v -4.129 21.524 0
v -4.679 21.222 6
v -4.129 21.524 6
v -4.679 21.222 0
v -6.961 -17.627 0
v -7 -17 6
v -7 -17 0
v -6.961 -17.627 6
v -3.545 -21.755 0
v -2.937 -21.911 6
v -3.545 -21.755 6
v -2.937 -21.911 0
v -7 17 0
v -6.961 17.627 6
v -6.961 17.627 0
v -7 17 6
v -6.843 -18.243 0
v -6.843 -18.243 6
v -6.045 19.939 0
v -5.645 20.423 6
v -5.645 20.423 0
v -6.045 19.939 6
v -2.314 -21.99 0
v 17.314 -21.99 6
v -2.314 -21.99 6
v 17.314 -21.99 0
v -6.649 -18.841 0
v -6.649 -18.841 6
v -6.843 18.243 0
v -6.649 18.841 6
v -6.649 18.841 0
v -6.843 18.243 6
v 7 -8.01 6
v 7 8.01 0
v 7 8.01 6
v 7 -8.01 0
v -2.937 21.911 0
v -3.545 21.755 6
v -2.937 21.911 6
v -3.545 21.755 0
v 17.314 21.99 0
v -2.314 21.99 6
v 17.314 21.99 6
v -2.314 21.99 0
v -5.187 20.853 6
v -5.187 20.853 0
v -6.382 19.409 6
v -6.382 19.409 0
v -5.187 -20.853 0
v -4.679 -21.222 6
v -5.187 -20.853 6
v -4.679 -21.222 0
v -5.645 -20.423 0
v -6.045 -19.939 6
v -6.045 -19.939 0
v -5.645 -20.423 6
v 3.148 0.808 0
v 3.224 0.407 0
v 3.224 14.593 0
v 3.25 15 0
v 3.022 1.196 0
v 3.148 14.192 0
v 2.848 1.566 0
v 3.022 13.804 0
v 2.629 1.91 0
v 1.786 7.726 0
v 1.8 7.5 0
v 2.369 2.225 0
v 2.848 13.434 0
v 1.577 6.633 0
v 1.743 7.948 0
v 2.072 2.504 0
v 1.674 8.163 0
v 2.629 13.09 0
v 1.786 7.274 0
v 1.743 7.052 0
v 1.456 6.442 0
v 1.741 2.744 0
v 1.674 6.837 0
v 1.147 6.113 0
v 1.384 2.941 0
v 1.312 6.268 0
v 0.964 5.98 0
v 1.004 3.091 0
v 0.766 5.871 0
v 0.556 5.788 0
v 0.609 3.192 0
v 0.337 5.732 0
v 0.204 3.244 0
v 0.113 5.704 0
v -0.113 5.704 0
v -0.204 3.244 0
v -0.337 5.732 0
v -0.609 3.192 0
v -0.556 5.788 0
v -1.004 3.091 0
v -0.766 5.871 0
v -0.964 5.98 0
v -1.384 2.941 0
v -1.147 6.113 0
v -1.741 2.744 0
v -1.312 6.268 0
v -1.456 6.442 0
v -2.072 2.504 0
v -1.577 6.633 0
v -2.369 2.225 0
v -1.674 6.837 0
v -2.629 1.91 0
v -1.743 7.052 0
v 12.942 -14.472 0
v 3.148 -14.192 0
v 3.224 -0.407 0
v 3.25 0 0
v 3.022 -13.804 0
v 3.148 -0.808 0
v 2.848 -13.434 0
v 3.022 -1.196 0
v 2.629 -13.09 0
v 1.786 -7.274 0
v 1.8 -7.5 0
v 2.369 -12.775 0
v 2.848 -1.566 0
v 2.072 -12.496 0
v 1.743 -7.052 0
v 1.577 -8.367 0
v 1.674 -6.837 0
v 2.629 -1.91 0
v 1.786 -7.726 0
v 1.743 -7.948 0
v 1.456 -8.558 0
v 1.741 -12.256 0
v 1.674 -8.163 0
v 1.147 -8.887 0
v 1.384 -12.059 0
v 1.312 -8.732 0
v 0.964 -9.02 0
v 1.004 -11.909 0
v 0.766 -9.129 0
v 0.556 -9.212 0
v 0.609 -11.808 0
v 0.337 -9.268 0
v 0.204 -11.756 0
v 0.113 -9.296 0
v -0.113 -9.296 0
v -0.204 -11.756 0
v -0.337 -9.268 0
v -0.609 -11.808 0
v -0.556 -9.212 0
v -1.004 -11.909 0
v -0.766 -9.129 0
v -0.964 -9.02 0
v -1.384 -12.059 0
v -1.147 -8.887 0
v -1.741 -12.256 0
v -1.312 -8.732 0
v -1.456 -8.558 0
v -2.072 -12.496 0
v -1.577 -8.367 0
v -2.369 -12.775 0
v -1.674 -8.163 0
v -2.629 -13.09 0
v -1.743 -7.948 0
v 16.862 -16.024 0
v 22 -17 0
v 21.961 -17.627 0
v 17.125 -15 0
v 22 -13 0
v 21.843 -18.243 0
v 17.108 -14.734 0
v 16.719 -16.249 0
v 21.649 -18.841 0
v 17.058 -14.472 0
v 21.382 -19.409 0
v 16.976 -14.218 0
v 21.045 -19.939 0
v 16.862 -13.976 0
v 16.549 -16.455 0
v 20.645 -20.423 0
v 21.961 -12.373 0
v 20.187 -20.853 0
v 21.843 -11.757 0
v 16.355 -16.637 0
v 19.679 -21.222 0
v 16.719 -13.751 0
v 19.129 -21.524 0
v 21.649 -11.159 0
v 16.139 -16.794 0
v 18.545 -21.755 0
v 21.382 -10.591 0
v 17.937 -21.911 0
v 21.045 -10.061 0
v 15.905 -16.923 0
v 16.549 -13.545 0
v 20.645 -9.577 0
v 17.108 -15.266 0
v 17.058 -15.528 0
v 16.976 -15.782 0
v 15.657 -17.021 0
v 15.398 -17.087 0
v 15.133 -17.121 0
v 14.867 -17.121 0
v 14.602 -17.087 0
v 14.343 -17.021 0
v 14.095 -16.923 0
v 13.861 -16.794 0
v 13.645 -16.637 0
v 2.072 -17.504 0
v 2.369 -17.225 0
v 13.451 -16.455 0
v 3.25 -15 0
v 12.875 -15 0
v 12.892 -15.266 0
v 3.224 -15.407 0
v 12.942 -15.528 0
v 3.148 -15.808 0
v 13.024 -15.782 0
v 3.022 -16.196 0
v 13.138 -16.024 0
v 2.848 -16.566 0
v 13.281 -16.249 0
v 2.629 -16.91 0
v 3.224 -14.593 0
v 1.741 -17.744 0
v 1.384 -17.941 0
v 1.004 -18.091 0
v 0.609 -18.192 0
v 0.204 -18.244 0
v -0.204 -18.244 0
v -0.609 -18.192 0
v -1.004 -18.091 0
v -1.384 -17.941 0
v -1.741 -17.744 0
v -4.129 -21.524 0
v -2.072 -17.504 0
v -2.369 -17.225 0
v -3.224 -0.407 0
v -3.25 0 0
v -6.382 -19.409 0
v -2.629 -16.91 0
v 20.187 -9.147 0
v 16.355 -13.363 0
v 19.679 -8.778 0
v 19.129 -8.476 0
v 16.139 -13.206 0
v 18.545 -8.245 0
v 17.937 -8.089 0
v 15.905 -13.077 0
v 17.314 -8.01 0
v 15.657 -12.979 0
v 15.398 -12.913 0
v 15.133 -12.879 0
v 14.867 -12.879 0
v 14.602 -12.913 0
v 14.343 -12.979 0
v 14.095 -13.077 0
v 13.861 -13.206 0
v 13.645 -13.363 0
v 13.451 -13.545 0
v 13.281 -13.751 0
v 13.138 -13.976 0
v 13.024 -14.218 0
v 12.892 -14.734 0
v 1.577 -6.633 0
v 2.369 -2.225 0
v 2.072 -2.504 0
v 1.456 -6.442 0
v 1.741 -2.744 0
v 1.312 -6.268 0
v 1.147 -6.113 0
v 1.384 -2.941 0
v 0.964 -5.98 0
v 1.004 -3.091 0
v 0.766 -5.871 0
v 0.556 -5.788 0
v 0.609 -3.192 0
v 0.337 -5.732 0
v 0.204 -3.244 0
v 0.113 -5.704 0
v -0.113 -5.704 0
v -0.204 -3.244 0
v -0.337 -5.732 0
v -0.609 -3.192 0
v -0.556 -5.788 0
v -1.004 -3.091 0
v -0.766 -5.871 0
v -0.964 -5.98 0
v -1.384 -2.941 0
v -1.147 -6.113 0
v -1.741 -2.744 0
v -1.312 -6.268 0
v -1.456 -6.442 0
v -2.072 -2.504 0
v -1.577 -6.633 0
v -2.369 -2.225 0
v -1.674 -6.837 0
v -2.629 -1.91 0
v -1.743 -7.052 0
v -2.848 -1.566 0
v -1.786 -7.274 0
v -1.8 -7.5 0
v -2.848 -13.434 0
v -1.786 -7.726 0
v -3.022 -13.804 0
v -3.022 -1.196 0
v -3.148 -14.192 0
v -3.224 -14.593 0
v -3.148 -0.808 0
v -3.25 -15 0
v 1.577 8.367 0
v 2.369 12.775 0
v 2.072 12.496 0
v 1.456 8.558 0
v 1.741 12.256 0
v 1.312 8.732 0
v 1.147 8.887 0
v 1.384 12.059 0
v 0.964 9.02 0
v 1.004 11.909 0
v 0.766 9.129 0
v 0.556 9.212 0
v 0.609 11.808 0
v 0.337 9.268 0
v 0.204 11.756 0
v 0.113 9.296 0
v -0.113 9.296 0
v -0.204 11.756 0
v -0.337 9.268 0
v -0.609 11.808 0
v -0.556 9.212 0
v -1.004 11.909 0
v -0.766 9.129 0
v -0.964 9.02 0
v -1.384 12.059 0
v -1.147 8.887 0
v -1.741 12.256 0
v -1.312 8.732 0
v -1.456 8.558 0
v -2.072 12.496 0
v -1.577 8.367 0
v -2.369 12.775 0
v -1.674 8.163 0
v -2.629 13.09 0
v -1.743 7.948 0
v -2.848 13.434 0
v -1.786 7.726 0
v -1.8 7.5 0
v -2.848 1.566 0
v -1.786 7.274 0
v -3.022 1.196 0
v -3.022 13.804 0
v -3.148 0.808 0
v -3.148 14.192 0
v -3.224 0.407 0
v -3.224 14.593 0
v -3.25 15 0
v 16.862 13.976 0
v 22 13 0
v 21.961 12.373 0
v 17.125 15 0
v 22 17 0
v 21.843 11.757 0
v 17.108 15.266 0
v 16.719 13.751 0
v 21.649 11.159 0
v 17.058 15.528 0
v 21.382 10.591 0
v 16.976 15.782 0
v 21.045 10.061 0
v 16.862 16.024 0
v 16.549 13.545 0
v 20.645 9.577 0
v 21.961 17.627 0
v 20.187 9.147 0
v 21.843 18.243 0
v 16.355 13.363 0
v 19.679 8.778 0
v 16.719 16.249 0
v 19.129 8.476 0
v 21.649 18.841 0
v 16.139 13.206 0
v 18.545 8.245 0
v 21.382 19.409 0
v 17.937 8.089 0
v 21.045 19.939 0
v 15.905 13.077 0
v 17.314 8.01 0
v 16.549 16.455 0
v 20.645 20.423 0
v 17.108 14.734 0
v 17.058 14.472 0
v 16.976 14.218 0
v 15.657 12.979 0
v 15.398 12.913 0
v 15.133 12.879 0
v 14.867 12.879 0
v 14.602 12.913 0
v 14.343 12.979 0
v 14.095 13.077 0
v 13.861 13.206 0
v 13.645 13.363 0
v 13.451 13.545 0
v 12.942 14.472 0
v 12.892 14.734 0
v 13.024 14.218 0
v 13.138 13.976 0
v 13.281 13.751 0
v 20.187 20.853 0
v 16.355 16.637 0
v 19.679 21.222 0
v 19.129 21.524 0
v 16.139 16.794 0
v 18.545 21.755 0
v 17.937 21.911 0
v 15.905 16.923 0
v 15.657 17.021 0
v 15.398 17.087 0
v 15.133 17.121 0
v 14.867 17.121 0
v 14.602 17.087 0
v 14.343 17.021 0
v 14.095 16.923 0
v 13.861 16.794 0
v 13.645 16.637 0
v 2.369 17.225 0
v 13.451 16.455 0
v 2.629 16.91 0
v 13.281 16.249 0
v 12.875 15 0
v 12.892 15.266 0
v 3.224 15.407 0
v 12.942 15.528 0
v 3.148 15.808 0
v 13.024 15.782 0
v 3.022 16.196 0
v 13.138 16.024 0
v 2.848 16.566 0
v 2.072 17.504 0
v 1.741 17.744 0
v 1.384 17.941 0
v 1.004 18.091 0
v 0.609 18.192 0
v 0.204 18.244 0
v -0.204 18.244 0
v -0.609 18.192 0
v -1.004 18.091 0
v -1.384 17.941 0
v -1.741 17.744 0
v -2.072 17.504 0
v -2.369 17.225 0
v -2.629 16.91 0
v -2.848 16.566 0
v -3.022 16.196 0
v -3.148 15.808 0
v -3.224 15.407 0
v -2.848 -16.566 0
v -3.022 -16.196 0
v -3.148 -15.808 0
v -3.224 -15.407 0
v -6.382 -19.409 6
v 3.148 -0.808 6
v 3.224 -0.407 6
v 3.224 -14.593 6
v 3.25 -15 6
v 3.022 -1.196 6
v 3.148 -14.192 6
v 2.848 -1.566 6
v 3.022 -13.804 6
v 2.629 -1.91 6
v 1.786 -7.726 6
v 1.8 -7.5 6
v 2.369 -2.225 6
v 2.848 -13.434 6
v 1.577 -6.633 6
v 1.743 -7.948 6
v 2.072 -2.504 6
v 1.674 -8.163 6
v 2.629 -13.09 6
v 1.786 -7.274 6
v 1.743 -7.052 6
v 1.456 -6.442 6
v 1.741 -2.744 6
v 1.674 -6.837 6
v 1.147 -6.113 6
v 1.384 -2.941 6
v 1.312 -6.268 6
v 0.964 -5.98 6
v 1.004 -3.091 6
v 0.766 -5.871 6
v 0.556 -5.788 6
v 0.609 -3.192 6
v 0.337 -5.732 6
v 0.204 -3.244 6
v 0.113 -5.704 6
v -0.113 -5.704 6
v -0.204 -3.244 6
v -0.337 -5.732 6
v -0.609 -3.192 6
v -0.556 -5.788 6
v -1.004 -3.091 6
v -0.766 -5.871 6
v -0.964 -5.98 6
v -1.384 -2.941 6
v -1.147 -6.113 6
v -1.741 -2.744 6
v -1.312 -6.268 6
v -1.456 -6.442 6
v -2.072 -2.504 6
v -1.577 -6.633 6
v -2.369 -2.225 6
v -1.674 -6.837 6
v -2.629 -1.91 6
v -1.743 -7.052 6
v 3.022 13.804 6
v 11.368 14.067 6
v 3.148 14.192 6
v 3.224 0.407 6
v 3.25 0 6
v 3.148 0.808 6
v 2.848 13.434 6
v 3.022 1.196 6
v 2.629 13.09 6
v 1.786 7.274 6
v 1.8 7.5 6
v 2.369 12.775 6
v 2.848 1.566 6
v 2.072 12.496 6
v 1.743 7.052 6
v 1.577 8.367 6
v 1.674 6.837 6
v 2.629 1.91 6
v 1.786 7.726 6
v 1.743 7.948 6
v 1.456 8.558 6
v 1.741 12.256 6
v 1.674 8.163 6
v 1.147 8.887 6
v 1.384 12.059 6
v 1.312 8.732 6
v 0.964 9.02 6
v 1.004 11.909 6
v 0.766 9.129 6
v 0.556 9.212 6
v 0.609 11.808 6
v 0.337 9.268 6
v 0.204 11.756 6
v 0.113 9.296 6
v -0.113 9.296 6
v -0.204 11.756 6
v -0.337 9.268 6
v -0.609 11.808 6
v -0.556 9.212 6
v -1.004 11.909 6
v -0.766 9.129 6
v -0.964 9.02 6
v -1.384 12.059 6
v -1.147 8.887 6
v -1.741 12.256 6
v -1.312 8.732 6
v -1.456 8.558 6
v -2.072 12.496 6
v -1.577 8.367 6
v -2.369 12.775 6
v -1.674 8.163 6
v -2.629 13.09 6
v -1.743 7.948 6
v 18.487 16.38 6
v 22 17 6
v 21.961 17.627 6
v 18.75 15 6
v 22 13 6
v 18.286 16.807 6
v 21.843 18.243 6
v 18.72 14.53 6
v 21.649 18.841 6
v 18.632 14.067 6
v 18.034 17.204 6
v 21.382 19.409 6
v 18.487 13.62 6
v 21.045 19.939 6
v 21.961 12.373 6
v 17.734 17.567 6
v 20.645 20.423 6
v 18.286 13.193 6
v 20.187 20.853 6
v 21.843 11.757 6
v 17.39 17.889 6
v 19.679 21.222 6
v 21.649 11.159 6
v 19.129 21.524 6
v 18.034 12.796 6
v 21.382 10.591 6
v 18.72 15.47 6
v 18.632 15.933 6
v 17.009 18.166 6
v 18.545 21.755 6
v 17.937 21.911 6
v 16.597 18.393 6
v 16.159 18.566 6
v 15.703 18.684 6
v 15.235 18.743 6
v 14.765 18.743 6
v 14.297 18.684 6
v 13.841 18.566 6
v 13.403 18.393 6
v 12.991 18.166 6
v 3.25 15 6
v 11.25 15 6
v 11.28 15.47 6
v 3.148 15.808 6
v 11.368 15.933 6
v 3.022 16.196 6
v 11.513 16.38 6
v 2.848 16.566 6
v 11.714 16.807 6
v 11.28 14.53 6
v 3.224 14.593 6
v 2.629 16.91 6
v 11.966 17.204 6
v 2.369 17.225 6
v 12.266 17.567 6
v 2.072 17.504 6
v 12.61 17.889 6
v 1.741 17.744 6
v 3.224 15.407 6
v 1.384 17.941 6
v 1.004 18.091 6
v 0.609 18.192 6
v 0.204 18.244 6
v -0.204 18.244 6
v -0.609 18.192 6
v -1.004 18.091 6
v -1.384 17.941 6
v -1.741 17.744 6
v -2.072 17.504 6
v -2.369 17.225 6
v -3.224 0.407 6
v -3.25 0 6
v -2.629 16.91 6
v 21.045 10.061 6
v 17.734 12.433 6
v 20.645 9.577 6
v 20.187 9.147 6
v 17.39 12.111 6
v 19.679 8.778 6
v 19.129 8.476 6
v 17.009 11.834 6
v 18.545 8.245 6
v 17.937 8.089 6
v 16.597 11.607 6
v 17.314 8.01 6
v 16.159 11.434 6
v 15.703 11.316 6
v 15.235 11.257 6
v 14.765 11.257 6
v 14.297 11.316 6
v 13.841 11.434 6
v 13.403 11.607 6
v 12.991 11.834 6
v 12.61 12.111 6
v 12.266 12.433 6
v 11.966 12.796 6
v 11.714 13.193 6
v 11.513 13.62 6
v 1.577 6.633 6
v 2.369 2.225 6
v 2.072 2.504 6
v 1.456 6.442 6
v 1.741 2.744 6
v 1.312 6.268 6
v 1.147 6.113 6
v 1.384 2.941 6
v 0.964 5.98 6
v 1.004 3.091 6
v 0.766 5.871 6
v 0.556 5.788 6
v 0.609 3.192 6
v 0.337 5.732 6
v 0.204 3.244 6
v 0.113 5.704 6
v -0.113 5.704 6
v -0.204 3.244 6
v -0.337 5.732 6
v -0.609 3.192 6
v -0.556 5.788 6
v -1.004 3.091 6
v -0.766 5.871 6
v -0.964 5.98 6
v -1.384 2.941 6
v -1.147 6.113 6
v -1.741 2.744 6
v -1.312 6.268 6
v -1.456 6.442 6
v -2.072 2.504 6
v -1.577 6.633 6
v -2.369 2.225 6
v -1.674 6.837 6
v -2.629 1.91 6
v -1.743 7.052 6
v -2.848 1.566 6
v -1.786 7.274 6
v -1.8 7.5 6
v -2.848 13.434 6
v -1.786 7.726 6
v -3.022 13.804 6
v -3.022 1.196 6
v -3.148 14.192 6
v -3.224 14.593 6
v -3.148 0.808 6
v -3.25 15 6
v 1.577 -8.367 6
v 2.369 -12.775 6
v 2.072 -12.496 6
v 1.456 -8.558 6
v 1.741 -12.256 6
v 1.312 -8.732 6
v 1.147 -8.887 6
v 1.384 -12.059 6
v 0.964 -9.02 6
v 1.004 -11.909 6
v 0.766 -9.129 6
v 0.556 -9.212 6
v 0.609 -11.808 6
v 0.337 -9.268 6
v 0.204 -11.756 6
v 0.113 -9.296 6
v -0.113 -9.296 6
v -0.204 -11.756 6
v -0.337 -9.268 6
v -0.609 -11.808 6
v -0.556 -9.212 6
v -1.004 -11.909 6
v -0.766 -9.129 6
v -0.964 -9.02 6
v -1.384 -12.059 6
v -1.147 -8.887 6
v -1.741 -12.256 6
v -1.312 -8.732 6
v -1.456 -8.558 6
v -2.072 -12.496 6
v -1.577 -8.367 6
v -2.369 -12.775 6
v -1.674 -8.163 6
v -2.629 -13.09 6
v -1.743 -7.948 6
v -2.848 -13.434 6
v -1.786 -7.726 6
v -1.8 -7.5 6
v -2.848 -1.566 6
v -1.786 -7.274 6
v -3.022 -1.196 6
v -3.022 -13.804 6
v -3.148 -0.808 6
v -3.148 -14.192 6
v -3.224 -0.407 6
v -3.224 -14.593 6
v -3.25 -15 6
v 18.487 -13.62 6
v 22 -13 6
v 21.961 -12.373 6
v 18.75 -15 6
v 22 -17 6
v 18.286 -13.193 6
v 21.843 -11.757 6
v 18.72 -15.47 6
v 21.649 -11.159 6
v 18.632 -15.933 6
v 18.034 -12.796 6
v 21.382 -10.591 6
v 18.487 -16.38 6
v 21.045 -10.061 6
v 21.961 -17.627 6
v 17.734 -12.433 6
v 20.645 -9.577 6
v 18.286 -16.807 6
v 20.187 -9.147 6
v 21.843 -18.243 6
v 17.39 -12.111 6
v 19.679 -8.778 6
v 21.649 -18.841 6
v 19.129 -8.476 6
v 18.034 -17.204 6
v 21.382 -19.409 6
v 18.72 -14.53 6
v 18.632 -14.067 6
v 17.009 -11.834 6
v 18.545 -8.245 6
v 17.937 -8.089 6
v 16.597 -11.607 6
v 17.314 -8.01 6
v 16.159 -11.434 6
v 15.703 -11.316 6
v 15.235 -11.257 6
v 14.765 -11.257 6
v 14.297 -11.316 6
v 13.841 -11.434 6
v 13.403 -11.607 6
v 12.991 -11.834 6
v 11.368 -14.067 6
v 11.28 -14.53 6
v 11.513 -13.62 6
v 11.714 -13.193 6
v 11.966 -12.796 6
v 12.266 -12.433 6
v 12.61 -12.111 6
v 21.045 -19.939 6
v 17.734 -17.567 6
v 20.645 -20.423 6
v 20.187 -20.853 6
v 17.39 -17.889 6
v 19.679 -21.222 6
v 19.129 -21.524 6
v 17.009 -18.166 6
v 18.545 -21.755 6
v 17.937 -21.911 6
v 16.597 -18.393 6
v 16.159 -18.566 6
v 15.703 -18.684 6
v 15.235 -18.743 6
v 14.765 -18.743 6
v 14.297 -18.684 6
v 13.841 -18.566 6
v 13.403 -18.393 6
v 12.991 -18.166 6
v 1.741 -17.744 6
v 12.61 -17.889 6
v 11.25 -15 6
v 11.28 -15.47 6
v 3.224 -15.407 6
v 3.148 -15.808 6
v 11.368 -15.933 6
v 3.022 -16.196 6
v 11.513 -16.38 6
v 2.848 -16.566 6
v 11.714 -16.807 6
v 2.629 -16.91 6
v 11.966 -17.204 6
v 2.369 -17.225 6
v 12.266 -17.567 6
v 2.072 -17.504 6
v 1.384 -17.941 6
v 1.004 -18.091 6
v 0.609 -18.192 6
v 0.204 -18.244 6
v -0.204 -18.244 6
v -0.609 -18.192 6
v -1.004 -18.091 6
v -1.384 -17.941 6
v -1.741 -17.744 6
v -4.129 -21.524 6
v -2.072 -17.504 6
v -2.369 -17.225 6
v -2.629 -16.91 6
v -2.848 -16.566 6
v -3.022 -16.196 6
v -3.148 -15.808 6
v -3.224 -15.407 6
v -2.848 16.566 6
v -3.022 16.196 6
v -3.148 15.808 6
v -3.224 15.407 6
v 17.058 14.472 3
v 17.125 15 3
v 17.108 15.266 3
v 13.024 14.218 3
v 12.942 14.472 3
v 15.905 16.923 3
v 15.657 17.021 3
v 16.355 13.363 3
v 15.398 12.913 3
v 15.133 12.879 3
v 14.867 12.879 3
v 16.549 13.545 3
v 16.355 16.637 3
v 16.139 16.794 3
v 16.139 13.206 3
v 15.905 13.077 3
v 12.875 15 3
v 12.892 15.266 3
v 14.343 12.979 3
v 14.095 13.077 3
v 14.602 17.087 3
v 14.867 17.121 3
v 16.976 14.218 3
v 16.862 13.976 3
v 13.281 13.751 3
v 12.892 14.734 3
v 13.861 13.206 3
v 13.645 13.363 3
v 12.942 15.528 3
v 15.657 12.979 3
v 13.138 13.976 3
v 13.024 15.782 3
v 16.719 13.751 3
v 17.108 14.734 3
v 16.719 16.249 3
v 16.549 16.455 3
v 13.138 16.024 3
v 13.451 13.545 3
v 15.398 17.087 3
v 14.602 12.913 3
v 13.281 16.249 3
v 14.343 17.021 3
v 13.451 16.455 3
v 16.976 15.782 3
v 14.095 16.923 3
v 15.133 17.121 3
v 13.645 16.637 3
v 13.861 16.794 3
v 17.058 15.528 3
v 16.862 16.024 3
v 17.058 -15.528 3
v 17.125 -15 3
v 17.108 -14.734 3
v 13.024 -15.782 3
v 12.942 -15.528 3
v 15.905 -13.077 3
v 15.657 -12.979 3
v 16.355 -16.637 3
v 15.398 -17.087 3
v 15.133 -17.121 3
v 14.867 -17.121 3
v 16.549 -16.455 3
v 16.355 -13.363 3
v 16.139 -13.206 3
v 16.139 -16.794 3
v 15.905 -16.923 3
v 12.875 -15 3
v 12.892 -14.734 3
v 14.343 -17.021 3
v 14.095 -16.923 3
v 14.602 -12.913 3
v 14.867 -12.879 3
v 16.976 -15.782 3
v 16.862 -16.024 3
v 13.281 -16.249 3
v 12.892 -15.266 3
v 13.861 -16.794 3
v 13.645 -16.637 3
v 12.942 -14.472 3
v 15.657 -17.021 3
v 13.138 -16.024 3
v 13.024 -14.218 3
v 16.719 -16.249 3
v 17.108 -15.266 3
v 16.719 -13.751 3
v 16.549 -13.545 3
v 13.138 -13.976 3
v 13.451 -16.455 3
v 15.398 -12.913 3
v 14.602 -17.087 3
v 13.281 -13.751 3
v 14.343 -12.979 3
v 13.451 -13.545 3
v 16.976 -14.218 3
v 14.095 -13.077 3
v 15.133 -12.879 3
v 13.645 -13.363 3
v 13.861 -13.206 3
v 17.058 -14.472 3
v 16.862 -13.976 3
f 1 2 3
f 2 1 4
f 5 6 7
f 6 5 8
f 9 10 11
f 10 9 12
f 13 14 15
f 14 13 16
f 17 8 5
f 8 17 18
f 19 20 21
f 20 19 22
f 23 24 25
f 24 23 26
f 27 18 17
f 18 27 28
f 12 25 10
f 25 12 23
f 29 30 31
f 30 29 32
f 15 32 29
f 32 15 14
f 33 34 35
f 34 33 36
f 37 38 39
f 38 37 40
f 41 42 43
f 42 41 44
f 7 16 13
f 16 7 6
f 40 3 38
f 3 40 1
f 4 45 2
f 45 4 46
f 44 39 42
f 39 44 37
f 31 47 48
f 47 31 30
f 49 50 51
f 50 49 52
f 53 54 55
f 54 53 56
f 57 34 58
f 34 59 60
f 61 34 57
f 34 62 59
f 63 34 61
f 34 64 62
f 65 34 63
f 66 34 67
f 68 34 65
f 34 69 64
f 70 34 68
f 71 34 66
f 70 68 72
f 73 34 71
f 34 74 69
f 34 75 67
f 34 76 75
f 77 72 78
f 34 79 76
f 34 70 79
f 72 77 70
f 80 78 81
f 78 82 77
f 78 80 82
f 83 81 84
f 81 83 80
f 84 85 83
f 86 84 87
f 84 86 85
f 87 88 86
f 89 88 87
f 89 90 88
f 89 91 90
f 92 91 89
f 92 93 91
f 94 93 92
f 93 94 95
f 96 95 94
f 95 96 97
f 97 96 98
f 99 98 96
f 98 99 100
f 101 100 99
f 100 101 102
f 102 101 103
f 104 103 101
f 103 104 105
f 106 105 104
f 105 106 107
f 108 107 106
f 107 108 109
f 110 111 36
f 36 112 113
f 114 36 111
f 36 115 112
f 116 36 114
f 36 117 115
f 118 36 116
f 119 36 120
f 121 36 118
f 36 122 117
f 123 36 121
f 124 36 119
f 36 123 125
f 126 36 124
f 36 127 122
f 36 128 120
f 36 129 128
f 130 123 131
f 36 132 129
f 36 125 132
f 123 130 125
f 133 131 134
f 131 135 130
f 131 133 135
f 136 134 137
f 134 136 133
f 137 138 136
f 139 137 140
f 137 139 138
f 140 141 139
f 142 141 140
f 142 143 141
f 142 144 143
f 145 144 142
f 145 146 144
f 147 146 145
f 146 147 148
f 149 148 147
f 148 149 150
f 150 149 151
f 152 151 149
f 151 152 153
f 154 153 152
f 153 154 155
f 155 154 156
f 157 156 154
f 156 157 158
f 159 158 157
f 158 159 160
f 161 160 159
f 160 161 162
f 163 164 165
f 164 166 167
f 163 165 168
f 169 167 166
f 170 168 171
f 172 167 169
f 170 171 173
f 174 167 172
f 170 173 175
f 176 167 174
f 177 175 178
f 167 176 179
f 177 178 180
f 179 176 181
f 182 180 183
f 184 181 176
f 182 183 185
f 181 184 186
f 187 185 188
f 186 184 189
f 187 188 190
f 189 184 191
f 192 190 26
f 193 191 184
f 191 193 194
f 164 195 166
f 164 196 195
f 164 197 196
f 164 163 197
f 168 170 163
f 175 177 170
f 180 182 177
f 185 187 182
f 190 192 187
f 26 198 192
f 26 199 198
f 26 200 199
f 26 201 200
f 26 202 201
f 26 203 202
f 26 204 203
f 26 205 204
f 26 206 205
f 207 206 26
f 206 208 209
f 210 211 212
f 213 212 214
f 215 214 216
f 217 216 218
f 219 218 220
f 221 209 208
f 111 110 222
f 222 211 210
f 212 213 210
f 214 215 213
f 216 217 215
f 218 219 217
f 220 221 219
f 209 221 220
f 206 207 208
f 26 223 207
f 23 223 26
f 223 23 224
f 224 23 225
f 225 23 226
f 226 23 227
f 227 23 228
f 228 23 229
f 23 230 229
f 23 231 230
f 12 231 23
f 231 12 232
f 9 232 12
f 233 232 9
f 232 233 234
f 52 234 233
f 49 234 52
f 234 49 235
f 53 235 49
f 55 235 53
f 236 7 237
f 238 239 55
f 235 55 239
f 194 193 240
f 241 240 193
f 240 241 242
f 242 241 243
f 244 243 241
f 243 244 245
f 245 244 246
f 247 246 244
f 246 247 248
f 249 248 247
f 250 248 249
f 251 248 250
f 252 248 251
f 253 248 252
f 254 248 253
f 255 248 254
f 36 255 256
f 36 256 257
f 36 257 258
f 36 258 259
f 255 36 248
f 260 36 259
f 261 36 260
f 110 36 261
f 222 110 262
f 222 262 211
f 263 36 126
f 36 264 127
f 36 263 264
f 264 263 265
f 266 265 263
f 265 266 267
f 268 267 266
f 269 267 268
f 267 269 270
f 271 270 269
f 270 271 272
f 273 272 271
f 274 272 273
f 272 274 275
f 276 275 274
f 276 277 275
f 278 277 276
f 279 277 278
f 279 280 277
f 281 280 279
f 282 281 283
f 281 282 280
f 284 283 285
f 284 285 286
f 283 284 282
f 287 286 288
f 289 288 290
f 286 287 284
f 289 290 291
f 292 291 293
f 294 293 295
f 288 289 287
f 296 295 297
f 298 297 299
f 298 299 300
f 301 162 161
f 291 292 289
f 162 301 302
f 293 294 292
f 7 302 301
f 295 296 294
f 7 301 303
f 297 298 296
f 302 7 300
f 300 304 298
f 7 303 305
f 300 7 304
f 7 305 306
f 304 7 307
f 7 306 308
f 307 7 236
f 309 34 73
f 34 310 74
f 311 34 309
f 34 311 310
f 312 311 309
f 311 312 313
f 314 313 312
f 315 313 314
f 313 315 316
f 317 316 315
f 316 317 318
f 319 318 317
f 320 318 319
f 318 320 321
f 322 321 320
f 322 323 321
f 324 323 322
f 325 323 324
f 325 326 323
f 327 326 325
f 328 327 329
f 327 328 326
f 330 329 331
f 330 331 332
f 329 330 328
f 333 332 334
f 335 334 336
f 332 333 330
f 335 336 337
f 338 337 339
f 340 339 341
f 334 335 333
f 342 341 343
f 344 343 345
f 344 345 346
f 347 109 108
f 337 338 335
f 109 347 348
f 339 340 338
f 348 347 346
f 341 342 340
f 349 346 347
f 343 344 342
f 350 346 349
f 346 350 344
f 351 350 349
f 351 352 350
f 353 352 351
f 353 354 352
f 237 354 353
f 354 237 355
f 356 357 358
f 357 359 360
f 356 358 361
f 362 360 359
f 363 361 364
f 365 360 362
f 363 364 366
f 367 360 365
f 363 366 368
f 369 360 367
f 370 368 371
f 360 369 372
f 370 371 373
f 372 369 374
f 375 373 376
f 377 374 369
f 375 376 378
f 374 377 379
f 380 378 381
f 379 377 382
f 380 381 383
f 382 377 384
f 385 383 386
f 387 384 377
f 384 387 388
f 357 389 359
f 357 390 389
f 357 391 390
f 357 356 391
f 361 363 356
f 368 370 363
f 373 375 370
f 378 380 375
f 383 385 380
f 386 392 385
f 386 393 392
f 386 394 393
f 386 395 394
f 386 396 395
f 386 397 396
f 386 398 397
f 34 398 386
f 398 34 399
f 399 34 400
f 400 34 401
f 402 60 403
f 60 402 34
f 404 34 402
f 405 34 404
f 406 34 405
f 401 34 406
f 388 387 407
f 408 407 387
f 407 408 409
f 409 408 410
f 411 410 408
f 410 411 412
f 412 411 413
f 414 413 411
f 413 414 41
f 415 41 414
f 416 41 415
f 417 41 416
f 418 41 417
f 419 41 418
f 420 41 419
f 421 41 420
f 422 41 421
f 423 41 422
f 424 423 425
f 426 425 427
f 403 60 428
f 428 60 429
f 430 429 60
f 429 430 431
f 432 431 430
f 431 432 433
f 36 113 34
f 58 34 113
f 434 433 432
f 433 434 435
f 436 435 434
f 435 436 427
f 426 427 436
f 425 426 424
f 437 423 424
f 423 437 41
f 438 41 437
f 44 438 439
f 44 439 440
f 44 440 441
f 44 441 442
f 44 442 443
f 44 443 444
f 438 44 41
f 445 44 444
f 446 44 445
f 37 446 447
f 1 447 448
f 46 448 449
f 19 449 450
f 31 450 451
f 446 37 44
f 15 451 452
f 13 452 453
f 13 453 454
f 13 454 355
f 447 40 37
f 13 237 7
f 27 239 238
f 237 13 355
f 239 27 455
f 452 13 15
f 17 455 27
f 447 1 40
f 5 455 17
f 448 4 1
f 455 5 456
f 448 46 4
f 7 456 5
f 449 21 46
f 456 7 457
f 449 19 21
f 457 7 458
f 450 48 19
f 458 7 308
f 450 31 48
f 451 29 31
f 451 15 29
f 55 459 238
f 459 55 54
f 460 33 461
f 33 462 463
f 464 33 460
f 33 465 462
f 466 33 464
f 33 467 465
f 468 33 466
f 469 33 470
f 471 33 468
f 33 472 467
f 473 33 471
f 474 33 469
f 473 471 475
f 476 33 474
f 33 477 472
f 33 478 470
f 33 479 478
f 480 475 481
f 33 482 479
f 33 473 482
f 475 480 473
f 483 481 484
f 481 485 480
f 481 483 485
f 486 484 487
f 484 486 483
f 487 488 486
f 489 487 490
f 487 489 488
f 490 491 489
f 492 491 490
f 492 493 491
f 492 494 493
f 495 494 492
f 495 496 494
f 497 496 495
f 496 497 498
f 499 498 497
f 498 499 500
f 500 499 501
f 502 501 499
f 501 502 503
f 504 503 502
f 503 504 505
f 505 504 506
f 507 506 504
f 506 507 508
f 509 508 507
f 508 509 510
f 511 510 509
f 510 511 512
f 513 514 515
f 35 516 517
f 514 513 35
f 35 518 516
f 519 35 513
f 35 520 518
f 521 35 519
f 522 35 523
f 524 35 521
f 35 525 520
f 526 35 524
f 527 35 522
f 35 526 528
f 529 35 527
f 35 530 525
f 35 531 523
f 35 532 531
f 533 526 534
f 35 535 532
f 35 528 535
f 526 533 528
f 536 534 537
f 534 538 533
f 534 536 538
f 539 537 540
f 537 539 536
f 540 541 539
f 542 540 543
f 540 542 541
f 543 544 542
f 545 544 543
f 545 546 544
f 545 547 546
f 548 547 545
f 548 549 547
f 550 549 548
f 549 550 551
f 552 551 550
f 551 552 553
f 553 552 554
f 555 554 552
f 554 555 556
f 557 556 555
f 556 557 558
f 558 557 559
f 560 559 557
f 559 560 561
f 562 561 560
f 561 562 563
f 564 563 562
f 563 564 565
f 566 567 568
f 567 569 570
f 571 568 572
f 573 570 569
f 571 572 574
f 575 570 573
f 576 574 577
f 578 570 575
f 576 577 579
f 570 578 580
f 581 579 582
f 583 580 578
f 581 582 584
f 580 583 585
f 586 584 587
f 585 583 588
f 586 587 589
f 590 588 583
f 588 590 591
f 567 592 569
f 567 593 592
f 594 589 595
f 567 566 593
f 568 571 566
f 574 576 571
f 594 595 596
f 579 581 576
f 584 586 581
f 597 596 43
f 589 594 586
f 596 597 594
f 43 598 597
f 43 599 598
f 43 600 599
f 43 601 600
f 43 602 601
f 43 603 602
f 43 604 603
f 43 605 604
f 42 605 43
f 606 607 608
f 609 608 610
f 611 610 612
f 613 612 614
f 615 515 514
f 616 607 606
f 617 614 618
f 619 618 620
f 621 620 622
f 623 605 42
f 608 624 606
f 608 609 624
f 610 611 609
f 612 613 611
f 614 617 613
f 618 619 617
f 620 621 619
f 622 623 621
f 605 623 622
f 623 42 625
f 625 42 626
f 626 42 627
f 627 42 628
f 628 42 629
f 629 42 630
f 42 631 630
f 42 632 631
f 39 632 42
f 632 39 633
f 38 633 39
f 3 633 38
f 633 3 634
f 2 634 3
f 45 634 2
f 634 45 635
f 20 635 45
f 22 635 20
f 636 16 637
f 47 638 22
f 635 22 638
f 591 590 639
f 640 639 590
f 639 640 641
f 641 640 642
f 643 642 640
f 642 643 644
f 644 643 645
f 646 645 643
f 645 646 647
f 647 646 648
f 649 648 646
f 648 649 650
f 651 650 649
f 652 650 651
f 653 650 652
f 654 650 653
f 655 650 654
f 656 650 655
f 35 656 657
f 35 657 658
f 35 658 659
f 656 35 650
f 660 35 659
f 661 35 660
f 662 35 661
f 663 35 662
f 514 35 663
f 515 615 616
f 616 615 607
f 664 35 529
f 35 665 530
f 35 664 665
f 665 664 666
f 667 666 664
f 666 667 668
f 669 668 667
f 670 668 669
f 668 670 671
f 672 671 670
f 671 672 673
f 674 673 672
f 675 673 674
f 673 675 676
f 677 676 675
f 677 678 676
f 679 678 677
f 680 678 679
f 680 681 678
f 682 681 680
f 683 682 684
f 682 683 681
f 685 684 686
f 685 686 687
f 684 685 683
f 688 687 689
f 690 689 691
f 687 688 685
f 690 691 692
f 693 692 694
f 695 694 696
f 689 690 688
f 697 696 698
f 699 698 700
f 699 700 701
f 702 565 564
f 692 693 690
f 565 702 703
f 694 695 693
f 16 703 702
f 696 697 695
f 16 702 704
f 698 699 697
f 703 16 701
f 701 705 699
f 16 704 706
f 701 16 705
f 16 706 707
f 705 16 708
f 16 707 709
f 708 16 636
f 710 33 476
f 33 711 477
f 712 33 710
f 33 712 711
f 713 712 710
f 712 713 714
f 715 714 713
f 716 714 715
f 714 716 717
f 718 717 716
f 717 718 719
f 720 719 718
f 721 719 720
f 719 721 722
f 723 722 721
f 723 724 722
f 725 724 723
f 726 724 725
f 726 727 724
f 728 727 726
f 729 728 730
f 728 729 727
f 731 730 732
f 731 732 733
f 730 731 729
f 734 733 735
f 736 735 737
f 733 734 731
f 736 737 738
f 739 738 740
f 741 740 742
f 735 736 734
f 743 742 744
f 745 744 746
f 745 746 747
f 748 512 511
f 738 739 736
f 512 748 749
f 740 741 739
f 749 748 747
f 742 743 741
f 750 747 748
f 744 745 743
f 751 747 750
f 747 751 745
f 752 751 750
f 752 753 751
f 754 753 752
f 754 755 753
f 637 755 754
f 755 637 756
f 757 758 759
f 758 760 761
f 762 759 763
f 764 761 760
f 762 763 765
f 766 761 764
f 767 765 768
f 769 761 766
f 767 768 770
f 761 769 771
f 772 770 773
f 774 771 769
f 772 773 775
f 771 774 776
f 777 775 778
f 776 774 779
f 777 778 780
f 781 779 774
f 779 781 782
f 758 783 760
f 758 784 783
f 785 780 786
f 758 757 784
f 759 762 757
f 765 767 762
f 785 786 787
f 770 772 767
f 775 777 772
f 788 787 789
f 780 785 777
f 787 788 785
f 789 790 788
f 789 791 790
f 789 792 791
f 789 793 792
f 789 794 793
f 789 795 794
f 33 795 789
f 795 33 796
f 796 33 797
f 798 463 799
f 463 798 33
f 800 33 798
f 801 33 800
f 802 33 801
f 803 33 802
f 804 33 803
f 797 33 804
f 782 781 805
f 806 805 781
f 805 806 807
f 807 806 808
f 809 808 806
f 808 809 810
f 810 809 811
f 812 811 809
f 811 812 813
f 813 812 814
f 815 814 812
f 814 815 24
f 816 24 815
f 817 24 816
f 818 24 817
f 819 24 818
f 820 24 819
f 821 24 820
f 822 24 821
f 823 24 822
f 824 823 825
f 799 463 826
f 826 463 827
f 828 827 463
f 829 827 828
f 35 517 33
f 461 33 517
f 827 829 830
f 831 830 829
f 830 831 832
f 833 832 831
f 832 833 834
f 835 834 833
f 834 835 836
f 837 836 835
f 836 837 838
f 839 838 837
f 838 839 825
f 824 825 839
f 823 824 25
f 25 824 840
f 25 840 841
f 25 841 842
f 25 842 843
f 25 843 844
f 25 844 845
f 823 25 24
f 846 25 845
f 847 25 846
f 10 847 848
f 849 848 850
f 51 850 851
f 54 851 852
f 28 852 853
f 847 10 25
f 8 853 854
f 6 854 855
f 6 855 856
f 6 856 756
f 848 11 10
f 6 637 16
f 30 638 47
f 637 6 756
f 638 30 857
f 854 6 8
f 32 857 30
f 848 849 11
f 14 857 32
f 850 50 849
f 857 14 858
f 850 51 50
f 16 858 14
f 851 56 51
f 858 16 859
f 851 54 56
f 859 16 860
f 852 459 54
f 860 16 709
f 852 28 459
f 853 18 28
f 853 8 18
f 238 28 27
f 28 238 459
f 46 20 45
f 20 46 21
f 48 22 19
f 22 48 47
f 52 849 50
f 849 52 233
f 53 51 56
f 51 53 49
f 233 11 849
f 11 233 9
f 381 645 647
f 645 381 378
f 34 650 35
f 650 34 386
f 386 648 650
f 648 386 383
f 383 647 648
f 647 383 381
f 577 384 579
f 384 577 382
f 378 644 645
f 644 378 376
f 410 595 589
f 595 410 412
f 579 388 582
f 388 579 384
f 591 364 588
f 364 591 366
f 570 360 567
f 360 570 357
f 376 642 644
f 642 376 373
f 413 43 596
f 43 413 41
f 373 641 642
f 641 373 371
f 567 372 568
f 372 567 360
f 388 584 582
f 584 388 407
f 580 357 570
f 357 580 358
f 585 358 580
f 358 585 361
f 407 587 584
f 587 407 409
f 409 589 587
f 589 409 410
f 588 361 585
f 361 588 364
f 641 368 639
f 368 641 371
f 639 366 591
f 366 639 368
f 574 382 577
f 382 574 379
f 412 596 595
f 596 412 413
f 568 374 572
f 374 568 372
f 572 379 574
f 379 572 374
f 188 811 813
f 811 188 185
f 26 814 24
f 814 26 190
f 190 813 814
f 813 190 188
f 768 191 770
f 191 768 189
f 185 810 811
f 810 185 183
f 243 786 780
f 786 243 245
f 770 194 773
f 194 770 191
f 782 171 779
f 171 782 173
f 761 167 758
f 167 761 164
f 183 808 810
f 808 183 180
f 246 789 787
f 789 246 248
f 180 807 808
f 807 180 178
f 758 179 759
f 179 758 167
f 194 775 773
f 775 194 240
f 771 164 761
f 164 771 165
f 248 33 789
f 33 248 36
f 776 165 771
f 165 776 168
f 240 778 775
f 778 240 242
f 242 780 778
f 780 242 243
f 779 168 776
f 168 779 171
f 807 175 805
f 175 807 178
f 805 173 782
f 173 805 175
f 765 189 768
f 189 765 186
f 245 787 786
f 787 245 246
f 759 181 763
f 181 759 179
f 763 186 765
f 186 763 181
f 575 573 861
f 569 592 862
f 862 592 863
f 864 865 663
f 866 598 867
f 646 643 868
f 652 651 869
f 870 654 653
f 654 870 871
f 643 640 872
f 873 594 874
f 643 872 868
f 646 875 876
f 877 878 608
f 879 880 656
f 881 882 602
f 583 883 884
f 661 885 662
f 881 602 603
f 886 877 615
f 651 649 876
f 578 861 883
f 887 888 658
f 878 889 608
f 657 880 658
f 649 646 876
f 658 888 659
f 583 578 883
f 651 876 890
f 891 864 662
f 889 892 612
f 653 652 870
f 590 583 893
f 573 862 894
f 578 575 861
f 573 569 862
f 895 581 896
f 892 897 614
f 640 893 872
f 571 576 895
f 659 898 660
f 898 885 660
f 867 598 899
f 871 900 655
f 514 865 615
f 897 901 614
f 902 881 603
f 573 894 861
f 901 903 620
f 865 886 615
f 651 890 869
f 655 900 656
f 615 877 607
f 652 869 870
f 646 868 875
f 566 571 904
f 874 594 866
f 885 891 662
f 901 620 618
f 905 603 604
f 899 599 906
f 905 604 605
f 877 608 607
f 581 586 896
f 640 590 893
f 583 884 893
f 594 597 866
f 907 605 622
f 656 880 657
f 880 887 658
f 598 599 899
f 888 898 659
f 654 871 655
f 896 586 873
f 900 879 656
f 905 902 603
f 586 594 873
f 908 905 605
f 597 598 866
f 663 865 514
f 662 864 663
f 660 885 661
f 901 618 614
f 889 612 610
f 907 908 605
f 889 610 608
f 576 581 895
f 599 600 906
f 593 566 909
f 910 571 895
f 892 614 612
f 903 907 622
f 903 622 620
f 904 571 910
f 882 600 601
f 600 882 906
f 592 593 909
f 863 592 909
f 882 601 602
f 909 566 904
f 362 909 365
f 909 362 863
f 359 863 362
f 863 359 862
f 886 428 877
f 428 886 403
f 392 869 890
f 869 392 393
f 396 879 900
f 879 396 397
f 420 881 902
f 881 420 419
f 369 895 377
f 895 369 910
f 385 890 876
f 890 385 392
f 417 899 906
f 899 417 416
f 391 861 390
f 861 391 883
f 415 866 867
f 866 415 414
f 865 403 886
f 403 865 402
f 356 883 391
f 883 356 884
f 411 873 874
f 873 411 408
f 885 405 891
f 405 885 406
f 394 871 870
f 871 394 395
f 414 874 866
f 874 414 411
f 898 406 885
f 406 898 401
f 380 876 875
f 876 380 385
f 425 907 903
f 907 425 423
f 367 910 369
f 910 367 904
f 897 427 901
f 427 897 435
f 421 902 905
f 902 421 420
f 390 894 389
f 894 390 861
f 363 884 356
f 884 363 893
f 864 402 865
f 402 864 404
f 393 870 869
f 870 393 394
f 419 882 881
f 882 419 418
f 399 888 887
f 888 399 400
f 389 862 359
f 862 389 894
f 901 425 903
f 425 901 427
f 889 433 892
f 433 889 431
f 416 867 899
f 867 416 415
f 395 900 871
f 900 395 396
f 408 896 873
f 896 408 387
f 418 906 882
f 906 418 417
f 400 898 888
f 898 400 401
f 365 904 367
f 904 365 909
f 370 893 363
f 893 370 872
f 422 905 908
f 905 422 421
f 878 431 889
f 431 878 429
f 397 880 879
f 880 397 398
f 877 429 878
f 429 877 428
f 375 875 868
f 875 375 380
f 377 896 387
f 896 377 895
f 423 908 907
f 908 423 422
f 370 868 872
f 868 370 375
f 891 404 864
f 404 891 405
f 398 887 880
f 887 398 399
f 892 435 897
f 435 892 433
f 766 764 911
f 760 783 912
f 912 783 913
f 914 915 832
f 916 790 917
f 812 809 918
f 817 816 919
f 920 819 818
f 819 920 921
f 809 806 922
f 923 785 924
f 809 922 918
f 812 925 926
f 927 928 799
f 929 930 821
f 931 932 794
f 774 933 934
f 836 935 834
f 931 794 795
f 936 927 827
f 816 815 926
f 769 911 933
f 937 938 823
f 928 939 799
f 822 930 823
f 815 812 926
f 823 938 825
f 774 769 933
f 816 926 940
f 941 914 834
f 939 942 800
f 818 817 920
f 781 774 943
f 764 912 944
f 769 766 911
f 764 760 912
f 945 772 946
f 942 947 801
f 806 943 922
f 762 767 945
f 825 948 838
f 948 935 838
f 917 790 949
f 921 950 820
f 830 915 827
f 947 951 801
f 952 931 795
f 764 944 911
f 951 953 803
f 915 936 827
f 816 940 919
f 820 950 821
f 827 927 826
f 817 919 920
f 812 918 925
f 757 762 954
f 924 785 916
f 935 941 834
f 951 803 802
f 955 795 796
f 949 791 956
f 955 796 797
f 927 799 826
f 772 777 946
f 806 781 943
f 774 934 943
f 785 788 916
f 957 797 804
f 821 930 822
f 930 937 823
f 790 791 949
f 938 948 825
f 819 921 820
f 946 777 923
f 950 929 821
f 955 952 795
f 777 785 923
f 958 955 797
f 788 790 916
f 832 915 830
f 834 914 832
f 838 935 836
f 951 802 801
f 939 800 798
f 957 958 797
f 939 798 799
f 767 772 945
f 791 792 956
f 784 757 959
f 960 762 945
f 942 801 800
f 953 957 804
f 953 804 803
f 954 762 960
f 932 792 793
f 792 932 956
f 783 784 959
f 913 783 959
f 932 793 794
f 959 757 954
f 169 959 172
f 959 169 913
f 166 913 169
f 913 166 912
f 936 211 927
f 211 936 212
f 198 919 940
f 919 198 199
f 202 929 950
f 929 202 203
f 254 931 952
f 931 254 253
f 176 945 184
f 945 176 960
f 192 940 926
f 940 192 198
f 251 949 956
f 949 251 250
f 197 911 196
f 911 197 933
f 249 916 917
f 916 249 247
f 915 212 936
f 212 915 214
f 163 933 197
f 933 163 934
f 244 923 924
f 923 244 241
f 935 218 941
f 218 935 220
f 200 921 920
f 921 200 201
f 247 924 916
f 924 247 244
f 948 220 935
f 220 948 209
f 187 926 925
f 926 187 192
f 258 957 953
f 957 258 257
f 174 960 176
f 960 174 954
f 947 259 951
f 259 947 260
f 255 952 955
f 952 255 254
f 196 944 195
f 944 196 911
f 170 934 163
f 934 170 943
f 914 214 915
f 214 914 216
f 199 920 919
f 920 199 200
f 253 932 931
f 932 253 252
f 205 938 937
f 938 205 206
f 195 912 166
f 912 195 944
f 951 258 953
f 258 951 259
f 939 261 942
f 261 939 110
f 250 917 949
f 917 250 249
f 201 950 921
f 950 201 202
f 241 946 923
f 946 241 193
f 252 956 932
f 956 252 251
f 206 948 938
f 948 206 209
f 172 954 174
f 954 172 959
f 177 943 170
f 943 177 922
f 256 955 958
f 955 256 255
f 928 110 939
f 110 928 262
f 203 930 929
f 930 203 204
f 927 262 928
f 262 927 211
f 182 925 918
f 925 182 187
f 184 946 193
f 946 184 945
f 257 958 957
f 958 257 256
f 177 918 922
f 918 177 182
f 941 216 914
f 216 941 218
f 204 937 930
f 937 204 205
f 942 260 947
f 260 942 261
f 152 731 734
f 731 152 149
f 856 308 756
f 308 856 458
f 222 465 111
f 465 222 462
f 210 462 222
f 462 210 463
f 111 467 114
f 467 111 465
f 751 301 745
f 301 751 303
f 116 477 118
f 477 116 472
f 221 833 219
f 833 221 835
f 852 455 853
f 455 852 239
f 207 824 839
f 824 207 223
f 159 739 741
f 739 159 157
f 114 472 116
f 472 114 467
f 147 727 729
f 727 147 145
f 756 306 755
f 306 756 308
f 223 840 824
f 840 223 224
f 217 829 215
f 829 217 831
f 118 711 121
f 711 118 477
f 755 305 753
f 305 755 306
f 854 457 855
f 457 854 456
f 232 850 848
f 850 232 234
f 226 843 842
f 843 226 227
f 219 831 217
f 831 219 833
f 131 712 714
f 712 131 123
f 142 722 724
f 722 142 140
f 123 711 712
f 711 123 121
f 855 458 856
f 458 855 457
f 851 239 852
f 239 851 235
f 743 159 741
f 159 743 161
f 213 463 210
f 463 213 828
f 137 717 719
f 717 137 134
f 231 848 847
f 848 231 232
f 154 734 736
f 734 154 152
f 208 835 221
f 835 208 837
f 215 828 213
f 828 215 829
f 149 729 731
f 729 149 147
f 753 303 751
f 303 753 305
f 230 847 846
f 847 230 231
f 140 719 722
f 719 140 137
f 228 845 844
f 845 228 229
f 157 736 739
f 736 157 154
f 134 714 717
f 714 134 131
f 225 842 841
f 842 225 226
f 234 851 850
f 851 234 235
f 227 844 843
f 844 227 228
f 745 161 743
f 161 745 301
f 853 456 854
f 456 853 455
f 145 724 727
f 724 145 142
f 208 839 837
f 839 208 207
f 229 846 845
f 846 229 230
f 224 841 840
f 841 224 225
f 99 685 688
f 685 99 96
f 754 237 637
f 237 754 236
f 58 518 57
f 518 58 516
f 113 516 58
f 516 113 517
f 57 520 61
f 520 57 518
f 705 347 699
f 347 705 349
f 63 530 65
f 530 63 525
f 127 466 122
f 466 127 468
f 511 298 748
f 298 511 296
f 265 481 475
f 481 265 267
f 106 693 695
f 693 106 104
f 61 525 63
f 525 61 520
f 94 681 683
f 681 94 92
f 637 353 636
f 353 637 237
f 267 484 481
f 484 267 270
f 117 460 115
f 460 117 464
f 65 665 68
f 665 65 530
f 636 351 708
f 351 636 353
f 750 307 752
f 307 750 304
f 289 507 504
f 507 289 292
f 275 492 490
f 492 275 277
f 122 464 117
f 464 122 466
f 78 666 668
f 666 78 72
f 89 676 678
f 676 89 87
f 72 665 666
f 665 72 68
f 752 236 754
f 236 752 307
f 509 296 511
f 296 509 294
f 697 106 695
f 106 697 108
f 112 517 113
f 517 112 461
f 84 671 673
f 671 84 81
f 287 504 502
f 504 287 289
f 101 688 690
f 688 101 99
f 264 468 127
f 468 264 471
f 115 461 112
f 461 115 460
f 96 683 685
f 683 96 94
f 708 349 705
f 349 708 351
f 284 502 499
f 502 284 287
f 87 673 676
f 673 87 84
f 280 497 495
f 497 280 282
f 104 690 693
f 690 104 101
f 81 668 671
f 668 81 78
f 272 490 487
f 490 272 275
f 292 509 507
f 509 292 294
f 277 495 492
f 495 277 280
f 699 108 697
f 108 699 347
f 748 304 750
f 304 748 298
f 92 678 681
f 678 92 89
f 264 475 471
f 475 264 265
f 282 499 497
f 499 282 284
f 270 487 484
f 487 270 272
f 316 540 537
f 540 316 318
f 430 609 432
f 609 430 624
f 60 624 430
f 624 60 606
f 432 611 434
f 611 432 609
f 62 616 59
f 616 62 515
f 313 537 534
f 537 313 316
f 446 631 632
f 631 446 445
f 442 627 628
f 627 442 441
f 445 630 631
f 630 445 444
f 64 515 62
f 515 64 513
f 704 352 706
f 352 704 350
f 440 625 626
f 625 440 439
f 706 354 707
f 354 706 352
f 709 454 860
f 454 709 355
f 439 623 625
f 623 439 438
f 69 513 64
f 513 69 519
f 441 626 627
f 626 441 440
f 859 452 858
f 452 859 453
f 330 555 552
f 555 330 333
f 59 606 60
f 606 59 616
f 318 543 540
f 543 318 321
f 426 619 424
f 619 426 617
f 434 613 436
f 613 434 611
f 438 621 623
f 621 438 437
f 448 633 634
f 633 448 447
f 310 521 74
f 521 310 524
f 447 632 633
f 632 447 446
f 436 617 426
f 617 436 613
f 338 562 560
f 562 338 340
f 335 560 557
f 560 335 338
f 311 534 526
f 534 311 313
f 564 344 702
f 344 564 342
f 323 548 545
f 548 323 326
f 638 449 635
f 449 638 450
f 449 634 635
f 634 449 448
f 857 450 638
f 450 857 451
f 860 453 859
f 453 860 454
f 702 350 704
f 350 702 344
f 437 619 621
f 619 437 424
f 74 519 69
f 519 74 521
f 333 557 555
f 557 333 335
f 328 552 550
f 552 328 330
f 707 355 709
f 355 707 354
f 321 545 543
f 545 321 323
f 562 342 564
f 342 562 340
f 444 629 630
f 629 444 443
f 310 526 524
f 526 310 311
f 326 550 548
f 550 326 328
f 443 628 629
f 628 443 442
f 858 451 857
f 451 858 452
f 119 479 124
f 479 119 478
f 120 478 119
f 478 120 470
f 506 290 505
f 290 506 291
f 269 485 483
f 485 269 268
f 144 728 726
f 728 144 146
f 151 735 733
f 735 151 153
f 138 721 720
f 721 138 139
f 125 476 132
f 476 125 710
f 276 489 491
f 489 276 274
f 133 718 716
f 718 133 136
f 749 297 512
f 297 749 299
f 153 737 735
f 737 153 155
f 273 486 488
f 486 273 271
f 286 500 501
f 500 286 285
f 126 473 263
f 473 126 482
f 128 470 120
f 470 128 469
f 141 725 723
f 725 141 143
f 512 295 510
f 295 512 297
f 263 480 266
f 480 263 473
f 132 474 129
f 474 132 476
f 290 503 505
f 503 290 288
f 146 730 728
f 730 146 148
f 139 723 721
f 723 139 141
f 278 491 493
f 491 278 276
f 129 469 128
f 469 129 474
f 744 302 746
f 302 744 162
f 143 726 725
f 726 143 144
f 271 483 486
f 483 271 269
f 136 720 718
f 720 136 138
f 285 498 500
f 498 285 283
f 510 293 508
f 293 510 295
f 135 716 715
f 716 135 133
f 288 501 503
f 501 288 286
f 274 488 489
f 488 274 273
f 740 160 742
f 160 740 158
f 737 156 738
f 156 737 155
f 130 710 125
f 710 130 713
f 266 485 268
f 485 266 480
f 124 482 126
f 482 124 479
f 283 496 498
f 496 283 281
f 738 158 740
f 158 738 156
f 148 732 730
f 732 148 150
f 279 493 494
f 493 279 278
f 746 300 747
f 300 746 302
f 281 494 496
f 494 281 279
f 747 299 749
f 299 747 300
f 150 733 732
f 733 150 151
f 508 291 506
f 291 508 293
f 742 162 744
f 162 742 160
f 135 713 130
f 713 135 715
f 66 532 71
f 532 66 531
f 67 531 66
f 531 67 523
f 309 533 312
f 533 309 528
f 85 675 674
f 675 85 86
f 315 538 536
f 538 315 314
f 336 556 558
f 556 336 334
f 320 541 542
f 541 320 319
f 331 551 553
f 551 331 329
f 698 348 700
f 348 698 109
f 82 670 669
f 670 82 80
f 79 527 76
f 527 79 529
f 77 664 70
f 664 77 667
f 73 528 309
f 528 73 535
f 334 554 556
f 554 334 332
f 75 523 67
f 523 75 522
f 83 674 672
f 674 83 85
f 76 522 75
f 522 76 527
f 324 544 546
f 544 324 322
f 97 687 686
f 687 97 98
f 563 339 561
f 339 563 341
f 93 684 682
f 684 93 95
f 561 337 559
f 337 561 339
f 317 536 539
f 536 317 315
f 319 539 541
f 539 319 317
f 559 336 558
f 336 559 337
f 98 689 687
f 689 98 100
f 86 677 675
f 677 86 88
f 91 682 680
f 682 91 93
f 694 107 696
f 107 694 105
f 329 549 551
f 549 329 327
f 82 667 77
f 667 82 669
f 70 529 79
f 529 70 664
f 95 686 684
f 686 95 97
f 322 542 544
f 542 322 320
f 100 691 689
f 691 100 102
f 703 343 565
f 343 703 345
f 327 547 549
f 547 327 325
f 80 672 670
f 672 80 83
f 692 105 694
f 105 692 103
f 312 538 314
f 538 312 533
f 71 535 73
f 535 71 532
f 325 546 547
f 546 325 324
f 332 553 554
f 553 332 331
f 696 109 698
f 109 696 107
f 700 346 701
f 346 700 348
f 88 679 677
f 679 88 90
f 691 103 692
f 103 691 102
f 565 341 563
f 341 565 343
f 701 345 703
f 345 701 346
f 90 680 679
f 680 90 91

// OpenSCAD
$fn = 50;


difference() {
	union() {
		hull() {
			translate(v = [-2.0000000000, 17.0000000000, 0]) {
				cylinder(h = 6, r = 5);
			}
			translate(v = [2.0000000000, 17.0000000000, 0]) {
				cylinder(h = 6, r = 5);
			}
			translate(v = [-2.0000000000, -17.0000000000, 0]) {
				cylinder(h = 6, r = 5);
			}
			translate(v = [2.0000000000, -17.0000000000, 0]) {
				cylinder(h = 6, r = 5);
			}
		}
		translate(v = [7.5000000000, 15.0000000000, 0]) {
			hull() {
				translate(v = [-9.5000000000, 2.0000000000, 0]) {
					cylinder(h = 6, r = 5);
				}
				translate(v = [9.5000000000, 2.0000000000, 0]) {
					cylinder(h = 6, r = 5);
				}
				translate(v = [-9.5000000000, -2.0000000000, 0]) {
					cylinder(h = 6, r = 5);
				}
				translate(v = [9.5000000000, -2.0000000000, 0]) {
					cylinder(h = 6, r = 5);
				}
			}
		}
		translate(v = [7.5000000000, -15.0000000000, 0]) {
			hull() {
				translate(v = [-9.5000000000, 2.0000000000, 0]) {
					cylinder(h = 6, r = 5);
				}
				translate(v = [9.5000000000, 2.0000000000, 0]) {
					cylinder(h = 6, r = 5);
				}
				translate(v = [-9.5000000000, -2.0000000000, 0]) {
					cylinder(h = 6, r = 5);
				}
				translate(v = [9.5000000000, -2.0000000000, 0]) {
					cylinder(h = 6, r = 5);
				}
			}
		}
	}
	union() {
		translate(v = [15.0000000000, 15.0000000000, 6]) {
			rotate(a = [0, 0, 0]) {
				difference() {
					union() {
						#translate(v = [0, 0, -6.0000000000]) {
							cylinder(h = 6, r = 2.0000000000);
						}
						#translate(v = [0, 0, -3]) {
							cylinder(h = 3, r1 = 2.1250000000, r2 = 3.7500000000);
						}
						#translate(v = [0, 0, -6.0000000000]) {
							cylinder(h = 6, r = 2.1250000000);
						}
						#translate(v = [0, 0, -6.0000000000]) {
							cylinder(h = 6, r = 2.0000000000);
						}
					}
					union();
				}
			}
		}
		translate(v = [15.0000000000, -15.0000000000, 6]) {
			rotate(a = [0, 0, 0]) {
				difference() {
					union() {
						#translate(v = [0, 0, -6.0000000000]) {
							cylinder(h = 6, r = 2.0000000000);
						}
						#translate(v = [0, 0, -3]) {
							cylinder(h = 3, r1 = 2.1250000000, r2 = 3.7500000000);
						}
						#translate(v = [0, 0, -6.0000000000]) {
							cylinder(h = 6, r = 2.1250000000);
						}
						#translate(v = [0, 0, -6.0000000000]) {
							cylinder(h = 6, r = 2.0000000000);
						}
					}
					union();
				}
			}
		}
		translate(v = [0.0000000000, -15.0000000000, 0]) {
			translate(v = [0, 0, -100]) {
				cylinder(h = 200, r = 3.2500000000);
			}
		}
		translate(v = [0, 0, -100]) {
			cylinder(h = 200, r = 3.2500000000);
		}
		translate(v = [0.0000000000, 15.0000000000, 0]) {
			translate(v = [0, 0, -100]) {
				cylinder(h = 200, r = 3.2500000000);
			}
		}
		translate(v = [0.0000000000, -15.0000000000, 0]) {
			translate(v = [0, 0, -100]) {
				cylinder(h = 200, r = 1.8000000000);
			}
		}
		translate(v = [0.0000000000, -7.5000000000, 0]) {
			translate(v = [0, 0, -100]) {
				cylinder(h = 200, r = 1.8000000000);
			}
		}
		translate(v = [0, 0, -100]) {
			cylinder(h = 200, r = 1.8000000000);
		}
		translate(v = [0.0000000000, 7.5000000000, 0]) {
			translate(v = [0, 0, -100]) {
				cylinder(h = 200, r = 1.8000000000);
			}
		}
		translate(v = [0.0000000000, 15.0000000000, 0]) {
			translate(v = [0, 0, -100]) {
				cylinder(h = 200, r = 1.8000000000);
			}
		}
	}
}
